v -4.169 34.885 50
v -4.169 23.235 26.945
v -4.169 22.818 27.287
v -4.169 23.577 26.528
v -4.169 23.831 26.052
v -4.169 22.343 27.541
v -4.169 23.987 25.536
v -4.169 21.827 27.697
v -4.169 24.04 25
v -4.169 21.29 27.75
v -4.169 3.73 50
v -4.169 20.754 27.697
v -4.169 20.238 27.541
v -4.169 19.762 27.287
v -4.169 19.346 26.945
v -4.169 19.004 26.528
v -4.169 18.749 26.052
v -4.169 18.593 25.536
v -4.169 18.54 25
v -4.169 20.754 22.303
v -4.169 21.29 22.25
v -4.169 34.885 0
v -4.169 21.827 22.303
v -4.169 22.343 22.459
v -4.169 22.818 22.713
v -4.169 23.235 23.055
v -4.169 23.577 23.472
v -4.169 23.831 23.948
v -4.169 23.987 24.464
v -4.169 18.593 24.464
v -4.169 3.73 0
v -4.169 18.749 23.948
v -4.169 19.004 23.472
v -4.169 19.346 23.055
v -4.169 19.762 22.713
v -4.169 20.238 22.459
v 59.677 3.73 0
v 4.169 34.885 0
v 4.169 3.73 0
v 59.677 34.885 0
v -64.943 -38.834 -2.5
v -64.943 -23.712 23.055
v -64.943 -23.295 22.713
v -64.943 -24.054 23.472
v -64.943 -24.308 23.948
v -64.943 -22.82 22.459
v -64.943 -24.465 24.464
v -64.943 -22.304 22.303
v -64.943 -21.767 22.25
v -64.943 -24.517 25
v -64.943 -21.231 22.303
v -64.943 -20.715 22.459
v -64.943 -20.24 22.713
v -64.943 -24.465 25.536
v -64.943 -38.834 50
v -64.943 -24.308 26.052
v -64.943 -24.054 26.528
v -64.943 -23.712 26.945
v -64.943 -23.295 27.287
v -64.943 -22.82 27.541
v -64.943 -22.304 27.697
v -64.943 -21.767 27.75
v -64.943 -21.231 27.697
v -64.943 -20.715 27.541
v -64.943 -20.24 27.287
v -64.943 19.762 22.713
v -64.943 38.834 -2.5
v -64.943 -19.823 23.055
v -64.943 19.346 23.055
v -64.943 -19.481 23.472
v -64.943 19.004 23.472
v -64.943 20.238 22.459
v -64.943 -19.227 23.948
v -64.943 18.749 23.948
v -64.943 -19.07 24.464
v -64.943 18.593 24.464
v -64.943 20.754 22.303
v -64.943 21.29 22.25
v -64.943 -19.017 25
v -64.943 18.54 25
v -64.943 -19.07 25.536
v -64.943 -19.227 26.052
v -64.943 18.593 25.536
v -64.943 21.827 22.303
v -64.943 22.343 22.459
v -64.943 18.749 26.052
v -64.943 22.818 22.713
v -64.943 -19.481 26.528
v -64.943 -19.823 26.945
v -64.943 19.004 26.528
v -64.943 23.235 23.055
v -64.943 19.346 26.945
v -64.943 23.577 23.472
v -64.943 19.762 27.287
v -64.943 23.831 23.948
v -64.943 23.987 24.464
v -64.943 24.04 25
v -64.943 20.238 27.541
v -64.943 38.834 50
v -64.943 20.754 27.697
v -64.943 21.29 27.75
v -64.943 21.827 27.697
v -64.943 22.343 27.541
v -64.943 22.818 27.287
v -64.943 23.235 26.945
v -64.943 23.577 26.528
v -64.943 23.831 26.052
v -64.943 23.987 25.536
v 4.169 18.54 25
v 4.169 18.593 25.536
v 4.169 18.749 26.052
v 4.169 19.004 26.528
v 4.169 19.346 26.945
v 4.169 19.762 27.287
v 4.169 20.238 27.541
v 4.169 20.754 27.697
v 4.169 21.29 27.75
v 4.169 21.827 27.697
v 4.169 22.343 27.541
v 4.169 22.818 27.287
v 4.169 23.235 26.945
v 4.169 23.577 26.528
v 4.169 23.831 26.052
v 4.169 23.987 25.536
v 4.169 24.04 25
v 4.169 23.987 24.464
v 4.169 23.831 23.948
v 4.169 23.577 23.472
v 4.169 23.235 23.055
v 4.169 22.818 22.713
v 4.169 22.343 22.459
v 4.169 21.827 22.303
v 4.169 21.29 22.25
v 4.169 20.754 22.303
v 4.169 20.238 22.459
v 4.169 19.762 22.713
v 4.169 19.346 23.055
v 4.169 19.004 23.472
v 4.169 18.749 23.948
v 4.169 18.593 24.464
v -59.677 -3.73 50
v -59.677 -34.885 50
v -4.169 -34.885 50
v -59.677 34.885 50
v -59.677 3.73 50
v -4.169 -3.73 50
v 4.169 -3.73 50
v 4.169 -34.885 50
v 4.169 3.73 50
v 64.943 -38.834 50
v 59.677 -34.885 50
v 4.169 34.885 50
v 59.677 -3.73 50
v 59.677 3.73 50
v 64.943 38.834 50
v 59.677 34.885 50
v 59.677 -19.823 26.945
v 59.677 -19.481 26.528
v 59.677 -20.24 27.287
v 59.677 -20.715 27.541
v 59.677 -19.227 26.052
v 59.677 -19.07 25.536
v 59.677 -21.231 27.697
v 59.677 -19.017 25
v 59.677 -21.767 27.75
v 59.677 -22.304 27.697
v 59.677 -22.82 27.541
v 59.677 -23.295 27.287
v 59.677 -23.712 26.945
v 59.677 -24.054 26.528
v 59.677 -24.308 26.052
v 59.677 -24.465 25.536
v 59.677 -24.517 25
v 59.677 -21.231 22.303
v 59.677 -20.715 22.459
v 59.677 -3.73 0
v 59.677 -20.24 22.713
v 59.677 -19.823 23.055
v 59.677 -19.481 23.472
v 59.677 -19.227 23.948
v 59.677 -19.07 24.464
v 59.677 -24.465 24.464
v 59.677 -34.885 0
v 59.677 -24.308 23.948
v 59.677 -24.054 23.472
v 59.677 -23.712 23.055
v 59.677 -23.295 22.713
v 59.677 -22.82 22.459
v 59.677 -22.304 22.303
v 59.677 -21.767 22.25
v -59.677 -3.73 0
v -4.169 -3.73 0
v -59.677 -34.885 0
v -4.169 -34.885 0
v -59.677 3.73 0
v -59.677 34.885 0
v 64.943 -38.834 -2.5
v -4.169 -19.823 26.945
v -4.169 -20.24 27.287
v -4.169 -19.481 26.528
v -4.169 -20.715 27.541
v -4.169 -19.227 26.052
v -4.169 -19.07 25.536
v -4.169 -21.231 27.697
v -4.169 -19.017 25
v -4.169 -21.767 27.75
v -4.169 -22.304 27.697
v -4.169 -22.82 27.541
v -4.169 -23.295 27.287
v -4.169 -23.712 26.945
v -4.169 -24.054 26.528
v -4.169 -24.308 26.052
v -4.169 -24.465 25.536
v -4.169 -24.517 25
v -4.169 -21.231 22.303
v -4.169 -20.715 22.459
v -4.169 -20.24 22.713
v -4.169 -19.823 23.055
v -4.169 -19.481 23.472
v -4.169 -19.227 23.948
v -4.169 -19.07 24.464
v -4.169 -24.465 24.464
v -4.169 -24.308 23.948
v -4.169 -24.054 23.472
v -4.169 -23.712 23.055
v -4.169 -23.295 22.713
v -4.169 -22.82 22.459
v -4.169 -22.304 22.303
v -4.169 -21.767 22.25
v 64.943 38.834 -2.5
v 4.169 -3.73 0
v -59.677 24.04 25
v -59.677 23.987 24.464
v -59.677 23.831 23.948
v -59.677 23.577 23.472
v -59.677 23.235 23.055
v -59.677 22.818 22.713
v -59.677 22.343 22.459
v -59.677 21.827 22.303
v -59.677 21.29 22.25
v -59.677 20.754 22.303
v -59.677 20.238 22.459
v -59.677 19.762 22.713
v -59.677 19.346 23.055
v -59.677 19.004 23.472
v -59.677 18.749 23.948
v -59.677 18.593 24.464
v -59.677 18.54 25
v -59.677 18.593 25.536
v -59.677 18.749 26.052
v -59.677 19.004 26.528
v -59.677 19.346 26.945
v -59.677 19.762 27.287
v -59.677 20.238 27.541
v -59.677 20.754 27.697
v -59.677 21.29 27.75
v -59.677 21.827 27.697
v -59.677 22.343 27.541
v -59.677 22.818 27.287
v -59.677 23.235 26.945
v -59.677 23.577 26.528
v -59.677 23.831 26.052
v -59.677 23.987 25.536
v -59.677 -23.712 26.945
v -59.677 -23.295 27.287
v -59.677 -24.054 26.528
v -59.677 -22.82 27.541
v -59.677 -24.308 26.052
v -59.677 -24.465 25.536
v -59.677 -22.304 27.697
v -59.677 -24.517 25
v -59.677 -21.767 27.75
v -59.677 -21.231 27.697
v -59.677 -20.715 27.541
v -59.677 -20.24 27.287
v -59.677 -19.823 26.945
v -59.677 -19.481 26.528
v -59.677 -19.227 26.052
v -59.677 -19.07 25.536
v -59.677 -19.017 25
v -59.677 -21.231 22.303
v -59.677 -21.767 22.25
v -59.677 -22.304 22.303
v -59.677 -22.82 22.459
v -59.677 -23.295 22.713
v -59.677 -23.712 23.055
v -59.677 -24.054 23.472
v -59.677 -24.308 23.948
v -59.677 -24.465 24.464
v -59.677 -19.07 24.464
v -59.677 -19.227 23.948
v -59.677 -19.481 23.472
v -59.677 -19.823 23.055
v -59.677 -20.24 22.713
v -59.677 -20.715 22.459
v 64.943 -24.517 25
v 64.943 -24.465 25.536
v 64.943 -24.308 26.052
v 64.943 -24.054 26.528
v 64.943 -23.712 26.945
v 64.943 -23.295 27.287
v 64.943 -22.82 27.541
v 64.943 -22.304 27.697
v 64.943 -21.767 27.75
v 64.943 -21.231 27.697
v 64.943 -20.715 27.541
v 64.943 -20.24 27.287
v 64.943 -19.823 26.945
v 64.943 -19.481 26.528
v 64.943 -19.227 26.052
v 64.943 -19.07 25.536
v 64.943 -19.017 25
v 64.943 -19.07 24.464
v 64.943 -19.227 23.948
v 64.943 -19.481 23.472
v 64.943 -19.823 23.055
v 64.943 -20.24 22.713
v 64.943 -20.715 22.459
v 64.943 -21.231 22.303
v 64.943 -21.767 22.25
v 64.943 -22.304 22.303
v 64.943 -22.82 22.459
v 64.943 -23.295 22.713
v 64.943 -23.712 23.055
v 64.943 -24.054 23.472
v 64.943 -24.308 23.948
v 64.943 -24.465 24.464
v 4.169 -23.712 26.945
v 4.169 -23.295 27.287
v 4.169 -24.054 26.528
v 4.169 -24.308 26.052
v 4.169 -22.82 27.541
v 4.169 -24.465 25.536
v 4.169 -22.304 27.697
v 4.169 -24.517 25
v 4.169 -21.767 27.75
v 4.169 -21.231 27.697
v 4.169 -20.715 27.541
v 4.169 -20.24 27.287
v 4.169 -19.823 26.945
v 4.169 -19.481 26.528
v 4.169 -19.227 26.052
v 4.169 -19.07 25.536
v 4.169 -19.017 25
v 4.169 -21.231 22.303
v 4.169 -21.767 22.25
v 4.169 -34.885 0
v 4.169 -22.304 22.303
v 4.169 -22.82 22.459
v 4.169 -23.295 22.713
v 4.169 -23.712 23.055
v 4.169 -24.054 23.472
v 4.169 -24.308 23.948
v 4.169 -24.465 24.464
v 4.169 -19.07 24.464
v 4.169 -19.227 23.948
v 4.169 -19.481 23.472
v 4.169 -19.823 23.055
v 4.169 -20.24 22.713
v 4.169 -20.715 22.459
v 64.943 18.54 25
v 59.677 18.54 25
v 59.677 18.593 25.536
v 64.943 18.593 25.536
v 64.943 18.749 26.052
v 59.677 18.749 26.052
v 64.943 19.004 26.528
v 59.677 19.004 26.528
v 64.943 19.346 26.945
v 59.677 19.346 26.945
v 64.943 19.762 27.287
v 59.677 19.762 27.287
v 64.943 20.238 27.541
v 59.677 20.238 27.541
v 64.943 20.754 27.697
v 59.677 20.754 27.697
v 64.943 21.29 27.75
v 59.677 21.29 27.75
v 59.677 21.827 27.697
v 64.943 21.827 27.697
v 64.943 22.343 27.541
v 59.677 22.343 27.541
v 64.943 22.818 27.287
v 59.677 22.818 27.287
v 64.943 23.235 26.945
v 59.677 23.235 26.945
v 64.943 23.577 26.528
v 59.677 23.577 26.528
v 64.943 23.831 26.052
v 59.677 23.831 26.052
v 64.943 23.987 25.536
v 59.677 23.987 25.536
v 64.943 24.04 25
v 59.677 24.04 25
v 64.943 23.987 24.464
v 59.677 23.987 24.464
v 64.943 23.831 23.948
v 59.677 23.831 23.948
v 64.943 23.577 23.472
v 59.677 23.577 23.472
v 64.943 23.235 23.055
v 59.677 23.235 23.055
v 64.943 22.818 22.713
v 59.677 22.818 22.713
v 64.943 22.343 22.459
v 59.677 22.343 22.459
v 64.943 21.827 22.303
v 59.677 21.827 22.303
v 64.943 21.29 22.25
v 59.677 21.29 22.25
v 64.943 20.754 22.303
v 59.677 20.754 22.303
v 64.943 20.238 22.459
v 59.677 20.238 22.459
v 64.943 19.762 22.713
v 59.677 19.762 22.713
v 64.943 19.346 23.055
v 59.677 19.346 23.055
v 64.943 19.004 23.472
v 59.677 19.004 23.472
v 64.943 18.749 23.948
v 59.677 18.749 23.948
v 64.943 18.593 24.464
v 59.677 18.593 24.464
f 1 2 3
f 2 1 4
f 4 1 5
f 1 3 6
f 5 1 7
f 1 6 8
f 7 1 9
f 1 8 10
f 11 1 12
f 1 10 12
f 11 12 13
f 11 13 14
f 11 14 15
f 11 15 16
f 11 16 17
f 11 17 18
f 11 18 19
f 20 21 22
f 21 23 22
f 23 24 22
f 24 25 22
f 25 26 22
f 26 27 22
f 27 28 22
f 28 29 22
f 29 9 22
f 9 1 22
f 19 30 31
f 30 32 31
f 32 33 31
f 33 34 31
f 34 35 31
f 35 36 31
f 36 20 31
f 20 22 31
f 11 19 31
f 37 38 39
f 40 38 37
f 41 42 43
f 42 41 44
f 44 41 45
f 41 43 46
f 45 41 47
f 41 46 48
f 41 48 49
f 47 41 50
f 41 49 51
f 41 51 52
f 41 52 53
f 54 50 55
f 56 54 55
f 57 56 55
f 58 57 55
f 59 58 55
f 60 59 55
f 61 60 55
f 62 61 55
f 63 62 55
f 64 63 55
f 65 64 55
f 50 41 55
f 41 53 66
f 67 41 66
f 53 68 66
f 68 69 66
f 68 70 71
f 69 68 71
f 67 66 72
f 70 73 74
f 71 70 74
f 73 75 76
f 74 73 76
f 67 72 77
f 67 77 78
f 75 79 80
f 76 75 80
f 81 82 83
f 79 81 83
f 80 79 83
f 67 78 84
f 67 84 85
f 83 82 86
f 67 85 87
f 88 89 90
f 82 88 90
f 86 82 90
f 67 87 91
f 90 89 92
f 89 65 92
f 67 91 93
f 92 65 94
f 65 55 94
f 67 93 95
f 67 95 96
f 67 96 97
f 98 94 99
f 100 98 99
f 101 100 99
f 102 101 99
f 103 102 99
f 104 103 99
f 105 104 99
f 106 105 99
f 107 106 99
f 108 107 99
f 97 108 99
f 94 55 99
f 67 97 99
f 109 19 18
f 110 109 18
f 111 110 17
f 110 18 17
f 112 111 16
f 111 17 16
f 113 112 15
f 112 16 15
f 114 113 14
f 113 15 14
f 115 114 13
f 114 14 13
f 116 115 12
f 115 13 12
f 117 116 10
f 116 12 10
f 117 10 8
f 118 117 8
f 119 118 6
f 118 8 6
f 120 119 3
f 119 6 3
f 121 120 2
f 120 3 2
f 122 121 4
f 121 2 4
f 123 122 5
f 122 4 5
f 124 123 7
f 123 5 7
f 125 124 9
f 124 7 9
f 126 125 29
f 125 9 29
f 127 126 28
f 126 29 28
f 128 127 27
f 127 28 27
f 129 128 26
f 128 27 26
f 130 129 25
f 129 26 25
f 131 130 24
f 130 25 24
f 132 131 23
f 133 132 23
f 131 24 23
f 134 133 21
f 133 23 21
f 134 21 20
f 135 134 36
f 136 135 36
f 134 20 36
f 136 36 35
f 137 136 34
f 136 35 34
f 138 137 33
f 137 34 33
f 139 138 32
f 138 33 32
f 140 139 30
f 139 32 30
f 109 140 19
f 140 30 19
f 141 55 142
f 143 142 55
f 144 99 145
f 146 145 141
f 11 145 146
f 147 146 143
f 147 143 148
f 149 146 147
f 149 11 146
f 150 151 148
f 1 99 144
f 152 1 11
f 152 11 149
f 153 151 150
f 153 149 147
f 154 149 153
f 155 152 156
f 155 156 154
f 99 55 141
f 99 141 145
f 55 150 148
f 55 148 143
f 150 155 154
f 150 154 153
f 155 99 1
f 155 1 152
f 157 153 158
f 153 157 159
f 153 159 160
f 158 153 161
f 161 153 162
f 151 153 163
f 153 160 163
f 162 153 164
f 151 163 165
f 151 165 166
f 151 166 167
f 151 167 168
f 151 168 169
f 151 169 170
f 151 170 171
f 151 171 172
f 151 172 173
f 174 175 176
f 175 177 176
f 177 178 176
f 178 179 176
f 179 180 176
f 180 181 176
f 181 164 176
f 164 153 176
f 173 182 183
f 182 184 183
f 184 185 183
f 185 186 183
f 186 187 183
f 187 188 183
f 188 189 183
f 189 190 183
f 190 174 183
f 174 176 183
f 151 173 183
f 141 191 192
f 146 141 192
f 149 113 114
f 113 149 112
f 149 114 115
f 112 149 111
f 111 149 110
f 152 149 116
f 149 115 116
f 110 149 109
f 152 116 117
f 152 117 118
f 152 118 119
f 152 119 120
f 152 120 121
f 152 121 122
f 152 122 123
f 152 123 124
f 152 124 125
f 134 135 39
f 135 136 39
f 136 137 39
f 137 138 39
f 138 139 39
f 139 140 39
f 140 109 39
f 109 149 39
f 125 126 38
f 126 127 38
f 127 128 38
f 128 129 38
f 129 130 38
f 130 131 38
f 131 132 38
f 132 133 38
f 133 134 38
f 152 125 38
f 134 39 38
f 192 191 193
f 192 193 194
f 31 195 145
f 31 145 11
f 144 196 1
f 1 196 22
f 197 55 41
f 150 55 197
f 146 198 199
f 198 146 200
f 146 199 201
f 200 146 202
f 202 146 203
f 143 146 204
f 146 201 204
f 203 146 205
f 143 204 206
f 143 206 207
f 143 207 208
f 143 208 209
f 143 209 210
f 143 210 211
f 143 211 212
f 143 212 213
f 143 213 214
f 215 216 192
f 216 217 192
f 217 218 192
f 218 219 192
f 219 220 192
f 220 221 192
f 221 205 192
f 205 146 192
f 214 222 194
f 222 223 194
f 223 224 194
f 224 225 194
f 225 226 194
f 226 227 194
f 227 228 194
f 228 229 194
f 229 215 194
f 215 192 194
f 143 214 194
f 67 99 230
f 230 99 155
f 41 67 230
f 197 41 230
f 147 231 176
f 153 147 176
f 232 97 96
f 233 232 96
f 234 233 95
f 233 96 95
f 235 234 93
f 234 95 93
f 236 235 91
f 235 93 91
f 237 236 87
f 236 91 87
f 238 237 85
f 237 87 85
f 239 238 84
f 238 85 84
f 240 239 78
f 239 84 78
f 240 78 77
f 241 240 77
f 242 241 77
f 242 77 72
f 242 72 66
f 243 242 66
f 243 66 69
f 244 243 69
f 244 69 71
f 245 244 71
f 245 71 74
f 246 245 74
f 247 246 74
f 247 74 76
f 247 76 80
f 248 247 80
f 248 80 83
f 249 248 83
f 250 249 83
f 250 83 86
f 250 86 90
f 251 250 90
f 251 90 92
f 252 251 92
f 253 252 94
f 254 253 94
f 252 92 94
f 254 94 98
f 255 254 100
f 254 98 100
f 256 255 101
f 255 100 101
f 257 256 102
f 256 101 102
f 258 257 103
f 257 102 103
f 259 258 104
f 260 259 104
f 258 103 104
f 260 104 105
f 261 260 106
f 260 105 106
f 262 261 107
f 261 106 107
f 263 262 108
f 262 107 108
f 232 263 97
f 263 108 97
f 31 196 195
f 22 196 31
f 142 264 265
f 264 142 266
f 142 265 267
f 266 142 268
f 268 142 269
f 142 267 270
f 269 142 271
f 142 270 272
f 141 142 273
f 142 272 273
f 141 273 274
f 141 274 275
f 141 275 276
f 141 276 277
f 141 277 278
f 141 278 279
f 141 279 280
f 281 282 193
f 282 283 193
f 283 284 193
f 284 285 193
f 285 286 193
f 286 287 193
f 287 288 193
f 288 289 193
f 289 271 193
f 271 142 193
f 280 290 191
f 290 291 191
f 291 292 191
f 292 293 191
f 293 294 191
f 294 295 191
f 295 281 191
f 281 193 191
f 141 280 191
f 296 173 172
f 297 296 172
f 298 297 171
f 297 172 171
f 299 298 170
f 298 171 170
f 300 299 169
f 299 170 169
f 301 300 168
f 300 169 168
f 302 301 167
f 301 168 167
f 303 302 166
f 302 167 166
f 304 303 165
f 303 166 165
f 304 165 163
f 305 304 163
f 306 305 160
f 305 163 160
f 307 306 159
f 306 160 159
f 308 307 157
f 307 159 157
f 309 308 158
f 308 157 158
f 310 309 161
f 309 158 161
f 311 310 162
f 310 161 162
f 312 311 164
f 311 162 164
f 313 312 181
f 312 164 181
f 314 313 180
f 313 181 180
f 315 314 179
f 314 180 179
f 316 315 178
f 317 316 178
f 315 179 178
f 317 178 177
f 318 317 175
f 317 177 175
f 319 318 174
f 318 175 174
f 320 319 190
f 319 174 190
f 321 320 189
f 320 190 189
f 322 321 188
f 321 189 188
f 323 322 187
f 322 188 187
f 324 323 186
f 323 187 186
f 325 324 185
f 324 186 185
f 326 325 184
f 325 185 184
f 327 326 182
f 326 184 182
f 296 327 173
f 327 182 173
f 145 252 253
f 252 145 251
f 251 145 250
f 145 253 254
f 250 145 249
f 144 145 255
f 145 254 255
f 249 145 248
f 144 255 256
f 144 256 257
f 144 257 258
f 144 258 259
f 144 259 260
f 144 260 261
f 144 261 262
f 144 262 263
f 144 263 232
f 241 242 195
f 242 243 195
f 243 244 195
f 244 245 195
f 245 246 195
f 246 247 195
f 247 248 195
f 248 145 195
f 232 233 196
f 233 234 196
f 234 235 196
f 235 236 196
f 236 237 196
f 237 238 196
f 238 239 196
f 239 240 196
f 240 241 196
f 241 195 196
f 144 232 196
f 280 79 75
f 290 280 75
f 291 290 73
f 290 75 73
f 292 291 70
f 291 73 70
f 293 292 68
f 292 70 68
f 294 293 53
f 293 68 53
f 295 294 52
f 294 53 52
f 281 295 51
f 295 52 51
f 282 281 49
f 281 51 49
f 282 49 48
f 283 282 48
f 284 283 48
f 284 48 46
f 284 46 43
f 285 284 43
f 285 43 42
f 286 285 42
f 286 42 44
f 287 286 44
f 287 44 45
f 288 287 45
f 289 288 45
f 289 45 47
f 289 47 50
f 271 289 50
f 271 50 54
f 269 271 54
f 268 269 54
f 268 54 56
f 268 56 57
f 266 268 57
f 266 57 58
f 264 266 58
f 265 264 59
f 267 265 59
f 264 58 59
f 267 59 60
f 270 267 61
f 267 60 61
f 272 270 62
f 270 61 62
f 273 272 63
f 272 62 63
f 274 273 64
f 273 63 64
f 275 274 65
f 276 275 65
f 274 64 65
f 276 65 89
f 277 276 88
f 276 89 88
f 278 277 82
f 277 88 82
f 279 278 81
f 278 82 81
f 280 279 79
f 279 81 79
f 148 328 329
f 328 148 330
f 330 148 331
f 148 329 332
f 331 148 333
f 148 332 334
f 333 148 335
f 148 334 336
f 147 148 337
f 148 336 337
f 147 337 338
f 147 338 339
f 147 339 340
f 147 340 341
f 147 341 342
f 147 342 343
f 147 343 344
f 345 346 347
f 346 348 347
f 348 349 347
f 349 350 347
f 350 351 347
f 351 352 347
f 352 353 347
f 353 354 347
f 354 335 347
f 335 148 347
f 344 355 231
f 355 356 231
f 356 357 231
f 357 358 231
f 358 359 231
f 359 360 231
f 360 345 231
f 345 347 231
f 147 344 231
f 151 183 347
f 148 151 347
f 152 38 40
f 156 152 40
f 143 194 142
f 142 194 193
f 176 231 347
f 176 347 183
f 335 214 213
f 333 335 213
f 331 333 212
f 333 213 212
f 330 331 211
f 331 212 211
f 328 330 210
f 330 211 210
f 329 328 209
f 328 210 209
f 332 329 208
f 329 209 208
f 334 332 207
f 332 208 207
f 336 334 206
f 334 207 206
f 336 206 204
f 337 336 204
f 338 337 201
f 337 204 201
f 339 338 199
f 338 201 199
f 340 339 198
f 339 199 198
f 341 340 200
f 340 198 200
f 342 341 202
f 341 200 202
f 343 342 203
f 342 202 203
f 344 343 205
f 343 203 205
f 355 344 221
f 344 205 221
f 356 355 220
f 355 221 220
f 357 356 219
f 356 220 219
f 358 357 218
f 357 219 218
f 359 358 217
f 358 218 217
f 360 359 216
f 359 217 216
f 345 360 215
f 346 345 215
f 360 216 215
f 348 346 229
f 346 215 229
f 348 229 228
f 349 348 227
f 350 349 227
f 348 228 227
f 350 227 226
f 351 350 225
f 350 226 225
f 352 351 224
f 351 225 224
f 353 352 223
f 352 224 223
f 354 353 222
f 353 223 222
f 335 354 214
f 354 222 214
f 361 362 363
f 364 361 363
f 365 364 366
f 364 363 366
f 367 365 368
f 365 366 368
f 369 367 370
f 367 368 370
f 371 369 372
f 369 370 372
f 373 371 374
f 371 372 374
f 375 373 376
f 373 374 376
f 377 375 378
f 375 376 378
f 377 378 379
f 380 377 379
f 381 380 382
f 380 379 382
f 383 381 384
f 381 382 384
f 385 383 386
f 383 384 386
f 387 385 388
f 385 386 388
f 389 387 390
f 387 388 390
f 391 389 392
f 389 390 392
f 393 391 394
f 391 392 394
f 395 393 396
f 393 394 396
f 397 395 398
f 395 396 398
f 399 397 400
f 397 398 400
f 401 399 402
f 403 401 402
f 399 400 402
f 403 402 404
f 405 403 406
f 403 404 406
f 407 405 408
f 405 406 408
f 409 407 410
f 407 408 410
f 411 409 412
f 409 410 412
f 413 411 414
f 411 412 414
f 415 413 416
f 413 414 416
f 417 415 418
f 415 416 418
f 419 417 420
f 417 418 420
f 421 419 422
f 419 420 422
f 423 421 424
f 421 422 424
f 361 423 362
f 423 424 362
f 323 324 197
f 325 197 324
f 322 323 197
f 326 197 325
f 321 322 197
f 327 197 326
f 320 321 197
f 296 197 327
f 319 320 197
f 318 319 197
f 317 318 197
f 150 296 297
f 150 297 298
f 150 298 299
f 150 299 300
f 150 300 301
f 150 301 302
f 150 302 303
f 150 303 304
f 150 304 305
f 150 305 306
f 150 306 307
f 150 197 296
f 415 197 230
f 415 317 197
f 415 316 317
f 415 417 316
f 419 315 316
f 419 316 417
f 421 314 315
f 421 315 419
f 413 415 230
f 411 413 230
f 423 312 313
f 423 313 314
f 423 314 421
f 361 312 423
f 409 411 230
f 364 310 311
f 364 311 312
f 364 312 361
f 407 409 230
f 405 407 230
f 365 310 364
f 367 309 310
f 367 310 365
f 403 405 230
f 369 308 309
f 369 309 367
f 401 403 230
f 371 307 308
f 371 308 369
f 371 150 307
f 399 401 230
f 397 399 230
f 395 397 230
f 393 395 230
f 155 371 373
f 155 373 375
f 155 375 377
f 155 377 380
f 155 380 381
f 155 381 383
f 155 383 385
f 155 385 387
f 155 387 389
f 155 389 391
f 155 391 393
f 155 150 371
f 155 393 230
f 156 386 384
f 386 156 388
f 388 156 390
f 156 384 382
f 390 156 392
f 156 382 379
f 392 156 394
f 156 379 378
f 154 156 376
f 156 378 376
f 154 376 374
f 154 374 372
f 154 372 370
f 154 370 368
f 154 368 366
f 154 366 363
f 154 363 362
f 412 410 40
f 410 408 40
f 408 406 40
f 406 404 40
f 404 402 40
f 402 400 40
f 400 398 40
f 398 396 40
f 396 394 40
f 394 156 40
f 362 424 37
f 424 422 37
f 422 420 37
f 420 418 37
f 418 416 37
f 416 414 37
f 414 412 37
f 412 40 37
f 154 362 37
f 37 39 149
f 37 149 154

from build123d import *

# Parameters (mm, degrees)
F0_W     = 129.8851817846
F0_H     = 77.667824924
F0_W_2   = 55.5083644576
F0_H_2   = 7.4596218765
F0_W_3   = 55.5083635263
F1_DEPTH = 50
F0_H_3   = 31.1548877507
F2_DEPTH = 2.5
F4_D     = 5.5
F4_DEPTH = 69.1122023778
F5_D     = 5.5


with BuildPart() as f1:
    # F0 (on Top) → F1 (new body)
    with BuildSketch(Plane.XY):
        Rectangle(F0_W, F0_H)
        Polygon((-59.6769750118, 3.7298109382), (-59.6769750118, 34.884698689), (-4.1686114855, 34.884698689), (4.1686105542, 34.884698689), (59.6769750118, 34.884698689), (59.6769750118, 3.7298109382), (59.6769750118, -3.7298109382), (59.6769750118, -34.884698689), (4.1686105542, -34.884698689), (-4.1686114855, -34.884698689), (-59.6769750118, -34.884698689), (-59.6769750118, -3.7298109382), align=None, mode=Mode.SUBTRACT)
        with Locations((31.922792783, 0)):
            Rectangle(F0_W_2, F0_H_2)
        with Locations((-31.9227932487, 0)):
            Rectangle(F0_W_3, F0_H_2)
        Polygon((4.1686105542, 34.884698689), (-4.1686114855, 34.884698689), (-4.1686114855, 3.7298109382), (-4.1686114855, -3.7298109382), (-4.1686114855, -34.884698689), (4.1686105542, -34.884698689), (4.1686105542, -3.7298109382), (4.1686105542, 3.7298109382), align=None)
    extrude(amount=F1_DEPTH)

    # F0 (on Top) → F2 (join)
    with BuildSketch(Plane.XY):
        Rectangle(F0_W, F0_H)
        Polygon((-59.6769750118, 3.7298109382), (-59.6769750118, 34.884698689), (-4.1686114855, 34.884698689), (4.1686105542, 34.884698689), (59.6769750118, 34.884698689), (59.6769750118, 3.7298109382), (59.6769750118, -3.7298109382), (59.6769750118, -34.884698689), (4.1686105542, -34.884698689), (-4.1686114855, -34.884698689), (-59.6769750118, -34.884698689), (-59.6769750118, -3.7298109382), align=None, mode=Mode.SUBTRACT)
        with Locations((-31.9227932487, -19.3072548136)):
            Rectangle(F0_W_3, F0_H_3)
        with Locations((-31.9227932487, 19.3072548136)):
            Rectangle(F0_W_3, F0_H_3)
        with Locations((31.922792783, -19.3072548136)):
            Rectangle(F0_W_2, F0_H_3)
        with Locations((31.922792783, 19.3072548136)):
            Rectangle(F0_W_2, F0_H_3)
        with Locations((31.922792783, 0)):
            Rectangle(F0_W_2, F0_H_2)
        Polygon((4.1686105542, 34.884698689), (-4.1686114855, 34.884698689), (-4.1686114855, 3.7298109382), (-4.1686114855, -3.7298109382), (-4.1686114855, -34.884698689), (4.1686105542, -34.884698689), (4.1686105542, -3.7298109382), (4.1686105542, 3.7298109382), align=None)
        with Locations((-31.9227932487, 0)):
            Rectangle(F0_W_3, F0_H_2)
    extrude(amount=-F2_DEPTH)

    # F4 (through all, one way)
    with BuildSketch(Plane(origin=(-4.1686114855, 0, 0), x_dir=(0, -1, 0), z_dir=(-1, 0, 0))):
        with Locations((21.7673890293, 25), (-21.2901681662, 25)):
            Circle(F4_D / 2)
    extrude(amount=-F4_DEPTH, mode=Mode.SUBTRACT)

    # F5 (through all)
    with Locations(Plane(origin=(-4.1686114855, 0, 0), x_dir=(0, -1, 0), z_dir=(1, 0, 0))):
        with Locations((-21.2901681662, -25), (21.7673890293, -25)):
            Hole(F5_D / 2)


solid = f1.part
